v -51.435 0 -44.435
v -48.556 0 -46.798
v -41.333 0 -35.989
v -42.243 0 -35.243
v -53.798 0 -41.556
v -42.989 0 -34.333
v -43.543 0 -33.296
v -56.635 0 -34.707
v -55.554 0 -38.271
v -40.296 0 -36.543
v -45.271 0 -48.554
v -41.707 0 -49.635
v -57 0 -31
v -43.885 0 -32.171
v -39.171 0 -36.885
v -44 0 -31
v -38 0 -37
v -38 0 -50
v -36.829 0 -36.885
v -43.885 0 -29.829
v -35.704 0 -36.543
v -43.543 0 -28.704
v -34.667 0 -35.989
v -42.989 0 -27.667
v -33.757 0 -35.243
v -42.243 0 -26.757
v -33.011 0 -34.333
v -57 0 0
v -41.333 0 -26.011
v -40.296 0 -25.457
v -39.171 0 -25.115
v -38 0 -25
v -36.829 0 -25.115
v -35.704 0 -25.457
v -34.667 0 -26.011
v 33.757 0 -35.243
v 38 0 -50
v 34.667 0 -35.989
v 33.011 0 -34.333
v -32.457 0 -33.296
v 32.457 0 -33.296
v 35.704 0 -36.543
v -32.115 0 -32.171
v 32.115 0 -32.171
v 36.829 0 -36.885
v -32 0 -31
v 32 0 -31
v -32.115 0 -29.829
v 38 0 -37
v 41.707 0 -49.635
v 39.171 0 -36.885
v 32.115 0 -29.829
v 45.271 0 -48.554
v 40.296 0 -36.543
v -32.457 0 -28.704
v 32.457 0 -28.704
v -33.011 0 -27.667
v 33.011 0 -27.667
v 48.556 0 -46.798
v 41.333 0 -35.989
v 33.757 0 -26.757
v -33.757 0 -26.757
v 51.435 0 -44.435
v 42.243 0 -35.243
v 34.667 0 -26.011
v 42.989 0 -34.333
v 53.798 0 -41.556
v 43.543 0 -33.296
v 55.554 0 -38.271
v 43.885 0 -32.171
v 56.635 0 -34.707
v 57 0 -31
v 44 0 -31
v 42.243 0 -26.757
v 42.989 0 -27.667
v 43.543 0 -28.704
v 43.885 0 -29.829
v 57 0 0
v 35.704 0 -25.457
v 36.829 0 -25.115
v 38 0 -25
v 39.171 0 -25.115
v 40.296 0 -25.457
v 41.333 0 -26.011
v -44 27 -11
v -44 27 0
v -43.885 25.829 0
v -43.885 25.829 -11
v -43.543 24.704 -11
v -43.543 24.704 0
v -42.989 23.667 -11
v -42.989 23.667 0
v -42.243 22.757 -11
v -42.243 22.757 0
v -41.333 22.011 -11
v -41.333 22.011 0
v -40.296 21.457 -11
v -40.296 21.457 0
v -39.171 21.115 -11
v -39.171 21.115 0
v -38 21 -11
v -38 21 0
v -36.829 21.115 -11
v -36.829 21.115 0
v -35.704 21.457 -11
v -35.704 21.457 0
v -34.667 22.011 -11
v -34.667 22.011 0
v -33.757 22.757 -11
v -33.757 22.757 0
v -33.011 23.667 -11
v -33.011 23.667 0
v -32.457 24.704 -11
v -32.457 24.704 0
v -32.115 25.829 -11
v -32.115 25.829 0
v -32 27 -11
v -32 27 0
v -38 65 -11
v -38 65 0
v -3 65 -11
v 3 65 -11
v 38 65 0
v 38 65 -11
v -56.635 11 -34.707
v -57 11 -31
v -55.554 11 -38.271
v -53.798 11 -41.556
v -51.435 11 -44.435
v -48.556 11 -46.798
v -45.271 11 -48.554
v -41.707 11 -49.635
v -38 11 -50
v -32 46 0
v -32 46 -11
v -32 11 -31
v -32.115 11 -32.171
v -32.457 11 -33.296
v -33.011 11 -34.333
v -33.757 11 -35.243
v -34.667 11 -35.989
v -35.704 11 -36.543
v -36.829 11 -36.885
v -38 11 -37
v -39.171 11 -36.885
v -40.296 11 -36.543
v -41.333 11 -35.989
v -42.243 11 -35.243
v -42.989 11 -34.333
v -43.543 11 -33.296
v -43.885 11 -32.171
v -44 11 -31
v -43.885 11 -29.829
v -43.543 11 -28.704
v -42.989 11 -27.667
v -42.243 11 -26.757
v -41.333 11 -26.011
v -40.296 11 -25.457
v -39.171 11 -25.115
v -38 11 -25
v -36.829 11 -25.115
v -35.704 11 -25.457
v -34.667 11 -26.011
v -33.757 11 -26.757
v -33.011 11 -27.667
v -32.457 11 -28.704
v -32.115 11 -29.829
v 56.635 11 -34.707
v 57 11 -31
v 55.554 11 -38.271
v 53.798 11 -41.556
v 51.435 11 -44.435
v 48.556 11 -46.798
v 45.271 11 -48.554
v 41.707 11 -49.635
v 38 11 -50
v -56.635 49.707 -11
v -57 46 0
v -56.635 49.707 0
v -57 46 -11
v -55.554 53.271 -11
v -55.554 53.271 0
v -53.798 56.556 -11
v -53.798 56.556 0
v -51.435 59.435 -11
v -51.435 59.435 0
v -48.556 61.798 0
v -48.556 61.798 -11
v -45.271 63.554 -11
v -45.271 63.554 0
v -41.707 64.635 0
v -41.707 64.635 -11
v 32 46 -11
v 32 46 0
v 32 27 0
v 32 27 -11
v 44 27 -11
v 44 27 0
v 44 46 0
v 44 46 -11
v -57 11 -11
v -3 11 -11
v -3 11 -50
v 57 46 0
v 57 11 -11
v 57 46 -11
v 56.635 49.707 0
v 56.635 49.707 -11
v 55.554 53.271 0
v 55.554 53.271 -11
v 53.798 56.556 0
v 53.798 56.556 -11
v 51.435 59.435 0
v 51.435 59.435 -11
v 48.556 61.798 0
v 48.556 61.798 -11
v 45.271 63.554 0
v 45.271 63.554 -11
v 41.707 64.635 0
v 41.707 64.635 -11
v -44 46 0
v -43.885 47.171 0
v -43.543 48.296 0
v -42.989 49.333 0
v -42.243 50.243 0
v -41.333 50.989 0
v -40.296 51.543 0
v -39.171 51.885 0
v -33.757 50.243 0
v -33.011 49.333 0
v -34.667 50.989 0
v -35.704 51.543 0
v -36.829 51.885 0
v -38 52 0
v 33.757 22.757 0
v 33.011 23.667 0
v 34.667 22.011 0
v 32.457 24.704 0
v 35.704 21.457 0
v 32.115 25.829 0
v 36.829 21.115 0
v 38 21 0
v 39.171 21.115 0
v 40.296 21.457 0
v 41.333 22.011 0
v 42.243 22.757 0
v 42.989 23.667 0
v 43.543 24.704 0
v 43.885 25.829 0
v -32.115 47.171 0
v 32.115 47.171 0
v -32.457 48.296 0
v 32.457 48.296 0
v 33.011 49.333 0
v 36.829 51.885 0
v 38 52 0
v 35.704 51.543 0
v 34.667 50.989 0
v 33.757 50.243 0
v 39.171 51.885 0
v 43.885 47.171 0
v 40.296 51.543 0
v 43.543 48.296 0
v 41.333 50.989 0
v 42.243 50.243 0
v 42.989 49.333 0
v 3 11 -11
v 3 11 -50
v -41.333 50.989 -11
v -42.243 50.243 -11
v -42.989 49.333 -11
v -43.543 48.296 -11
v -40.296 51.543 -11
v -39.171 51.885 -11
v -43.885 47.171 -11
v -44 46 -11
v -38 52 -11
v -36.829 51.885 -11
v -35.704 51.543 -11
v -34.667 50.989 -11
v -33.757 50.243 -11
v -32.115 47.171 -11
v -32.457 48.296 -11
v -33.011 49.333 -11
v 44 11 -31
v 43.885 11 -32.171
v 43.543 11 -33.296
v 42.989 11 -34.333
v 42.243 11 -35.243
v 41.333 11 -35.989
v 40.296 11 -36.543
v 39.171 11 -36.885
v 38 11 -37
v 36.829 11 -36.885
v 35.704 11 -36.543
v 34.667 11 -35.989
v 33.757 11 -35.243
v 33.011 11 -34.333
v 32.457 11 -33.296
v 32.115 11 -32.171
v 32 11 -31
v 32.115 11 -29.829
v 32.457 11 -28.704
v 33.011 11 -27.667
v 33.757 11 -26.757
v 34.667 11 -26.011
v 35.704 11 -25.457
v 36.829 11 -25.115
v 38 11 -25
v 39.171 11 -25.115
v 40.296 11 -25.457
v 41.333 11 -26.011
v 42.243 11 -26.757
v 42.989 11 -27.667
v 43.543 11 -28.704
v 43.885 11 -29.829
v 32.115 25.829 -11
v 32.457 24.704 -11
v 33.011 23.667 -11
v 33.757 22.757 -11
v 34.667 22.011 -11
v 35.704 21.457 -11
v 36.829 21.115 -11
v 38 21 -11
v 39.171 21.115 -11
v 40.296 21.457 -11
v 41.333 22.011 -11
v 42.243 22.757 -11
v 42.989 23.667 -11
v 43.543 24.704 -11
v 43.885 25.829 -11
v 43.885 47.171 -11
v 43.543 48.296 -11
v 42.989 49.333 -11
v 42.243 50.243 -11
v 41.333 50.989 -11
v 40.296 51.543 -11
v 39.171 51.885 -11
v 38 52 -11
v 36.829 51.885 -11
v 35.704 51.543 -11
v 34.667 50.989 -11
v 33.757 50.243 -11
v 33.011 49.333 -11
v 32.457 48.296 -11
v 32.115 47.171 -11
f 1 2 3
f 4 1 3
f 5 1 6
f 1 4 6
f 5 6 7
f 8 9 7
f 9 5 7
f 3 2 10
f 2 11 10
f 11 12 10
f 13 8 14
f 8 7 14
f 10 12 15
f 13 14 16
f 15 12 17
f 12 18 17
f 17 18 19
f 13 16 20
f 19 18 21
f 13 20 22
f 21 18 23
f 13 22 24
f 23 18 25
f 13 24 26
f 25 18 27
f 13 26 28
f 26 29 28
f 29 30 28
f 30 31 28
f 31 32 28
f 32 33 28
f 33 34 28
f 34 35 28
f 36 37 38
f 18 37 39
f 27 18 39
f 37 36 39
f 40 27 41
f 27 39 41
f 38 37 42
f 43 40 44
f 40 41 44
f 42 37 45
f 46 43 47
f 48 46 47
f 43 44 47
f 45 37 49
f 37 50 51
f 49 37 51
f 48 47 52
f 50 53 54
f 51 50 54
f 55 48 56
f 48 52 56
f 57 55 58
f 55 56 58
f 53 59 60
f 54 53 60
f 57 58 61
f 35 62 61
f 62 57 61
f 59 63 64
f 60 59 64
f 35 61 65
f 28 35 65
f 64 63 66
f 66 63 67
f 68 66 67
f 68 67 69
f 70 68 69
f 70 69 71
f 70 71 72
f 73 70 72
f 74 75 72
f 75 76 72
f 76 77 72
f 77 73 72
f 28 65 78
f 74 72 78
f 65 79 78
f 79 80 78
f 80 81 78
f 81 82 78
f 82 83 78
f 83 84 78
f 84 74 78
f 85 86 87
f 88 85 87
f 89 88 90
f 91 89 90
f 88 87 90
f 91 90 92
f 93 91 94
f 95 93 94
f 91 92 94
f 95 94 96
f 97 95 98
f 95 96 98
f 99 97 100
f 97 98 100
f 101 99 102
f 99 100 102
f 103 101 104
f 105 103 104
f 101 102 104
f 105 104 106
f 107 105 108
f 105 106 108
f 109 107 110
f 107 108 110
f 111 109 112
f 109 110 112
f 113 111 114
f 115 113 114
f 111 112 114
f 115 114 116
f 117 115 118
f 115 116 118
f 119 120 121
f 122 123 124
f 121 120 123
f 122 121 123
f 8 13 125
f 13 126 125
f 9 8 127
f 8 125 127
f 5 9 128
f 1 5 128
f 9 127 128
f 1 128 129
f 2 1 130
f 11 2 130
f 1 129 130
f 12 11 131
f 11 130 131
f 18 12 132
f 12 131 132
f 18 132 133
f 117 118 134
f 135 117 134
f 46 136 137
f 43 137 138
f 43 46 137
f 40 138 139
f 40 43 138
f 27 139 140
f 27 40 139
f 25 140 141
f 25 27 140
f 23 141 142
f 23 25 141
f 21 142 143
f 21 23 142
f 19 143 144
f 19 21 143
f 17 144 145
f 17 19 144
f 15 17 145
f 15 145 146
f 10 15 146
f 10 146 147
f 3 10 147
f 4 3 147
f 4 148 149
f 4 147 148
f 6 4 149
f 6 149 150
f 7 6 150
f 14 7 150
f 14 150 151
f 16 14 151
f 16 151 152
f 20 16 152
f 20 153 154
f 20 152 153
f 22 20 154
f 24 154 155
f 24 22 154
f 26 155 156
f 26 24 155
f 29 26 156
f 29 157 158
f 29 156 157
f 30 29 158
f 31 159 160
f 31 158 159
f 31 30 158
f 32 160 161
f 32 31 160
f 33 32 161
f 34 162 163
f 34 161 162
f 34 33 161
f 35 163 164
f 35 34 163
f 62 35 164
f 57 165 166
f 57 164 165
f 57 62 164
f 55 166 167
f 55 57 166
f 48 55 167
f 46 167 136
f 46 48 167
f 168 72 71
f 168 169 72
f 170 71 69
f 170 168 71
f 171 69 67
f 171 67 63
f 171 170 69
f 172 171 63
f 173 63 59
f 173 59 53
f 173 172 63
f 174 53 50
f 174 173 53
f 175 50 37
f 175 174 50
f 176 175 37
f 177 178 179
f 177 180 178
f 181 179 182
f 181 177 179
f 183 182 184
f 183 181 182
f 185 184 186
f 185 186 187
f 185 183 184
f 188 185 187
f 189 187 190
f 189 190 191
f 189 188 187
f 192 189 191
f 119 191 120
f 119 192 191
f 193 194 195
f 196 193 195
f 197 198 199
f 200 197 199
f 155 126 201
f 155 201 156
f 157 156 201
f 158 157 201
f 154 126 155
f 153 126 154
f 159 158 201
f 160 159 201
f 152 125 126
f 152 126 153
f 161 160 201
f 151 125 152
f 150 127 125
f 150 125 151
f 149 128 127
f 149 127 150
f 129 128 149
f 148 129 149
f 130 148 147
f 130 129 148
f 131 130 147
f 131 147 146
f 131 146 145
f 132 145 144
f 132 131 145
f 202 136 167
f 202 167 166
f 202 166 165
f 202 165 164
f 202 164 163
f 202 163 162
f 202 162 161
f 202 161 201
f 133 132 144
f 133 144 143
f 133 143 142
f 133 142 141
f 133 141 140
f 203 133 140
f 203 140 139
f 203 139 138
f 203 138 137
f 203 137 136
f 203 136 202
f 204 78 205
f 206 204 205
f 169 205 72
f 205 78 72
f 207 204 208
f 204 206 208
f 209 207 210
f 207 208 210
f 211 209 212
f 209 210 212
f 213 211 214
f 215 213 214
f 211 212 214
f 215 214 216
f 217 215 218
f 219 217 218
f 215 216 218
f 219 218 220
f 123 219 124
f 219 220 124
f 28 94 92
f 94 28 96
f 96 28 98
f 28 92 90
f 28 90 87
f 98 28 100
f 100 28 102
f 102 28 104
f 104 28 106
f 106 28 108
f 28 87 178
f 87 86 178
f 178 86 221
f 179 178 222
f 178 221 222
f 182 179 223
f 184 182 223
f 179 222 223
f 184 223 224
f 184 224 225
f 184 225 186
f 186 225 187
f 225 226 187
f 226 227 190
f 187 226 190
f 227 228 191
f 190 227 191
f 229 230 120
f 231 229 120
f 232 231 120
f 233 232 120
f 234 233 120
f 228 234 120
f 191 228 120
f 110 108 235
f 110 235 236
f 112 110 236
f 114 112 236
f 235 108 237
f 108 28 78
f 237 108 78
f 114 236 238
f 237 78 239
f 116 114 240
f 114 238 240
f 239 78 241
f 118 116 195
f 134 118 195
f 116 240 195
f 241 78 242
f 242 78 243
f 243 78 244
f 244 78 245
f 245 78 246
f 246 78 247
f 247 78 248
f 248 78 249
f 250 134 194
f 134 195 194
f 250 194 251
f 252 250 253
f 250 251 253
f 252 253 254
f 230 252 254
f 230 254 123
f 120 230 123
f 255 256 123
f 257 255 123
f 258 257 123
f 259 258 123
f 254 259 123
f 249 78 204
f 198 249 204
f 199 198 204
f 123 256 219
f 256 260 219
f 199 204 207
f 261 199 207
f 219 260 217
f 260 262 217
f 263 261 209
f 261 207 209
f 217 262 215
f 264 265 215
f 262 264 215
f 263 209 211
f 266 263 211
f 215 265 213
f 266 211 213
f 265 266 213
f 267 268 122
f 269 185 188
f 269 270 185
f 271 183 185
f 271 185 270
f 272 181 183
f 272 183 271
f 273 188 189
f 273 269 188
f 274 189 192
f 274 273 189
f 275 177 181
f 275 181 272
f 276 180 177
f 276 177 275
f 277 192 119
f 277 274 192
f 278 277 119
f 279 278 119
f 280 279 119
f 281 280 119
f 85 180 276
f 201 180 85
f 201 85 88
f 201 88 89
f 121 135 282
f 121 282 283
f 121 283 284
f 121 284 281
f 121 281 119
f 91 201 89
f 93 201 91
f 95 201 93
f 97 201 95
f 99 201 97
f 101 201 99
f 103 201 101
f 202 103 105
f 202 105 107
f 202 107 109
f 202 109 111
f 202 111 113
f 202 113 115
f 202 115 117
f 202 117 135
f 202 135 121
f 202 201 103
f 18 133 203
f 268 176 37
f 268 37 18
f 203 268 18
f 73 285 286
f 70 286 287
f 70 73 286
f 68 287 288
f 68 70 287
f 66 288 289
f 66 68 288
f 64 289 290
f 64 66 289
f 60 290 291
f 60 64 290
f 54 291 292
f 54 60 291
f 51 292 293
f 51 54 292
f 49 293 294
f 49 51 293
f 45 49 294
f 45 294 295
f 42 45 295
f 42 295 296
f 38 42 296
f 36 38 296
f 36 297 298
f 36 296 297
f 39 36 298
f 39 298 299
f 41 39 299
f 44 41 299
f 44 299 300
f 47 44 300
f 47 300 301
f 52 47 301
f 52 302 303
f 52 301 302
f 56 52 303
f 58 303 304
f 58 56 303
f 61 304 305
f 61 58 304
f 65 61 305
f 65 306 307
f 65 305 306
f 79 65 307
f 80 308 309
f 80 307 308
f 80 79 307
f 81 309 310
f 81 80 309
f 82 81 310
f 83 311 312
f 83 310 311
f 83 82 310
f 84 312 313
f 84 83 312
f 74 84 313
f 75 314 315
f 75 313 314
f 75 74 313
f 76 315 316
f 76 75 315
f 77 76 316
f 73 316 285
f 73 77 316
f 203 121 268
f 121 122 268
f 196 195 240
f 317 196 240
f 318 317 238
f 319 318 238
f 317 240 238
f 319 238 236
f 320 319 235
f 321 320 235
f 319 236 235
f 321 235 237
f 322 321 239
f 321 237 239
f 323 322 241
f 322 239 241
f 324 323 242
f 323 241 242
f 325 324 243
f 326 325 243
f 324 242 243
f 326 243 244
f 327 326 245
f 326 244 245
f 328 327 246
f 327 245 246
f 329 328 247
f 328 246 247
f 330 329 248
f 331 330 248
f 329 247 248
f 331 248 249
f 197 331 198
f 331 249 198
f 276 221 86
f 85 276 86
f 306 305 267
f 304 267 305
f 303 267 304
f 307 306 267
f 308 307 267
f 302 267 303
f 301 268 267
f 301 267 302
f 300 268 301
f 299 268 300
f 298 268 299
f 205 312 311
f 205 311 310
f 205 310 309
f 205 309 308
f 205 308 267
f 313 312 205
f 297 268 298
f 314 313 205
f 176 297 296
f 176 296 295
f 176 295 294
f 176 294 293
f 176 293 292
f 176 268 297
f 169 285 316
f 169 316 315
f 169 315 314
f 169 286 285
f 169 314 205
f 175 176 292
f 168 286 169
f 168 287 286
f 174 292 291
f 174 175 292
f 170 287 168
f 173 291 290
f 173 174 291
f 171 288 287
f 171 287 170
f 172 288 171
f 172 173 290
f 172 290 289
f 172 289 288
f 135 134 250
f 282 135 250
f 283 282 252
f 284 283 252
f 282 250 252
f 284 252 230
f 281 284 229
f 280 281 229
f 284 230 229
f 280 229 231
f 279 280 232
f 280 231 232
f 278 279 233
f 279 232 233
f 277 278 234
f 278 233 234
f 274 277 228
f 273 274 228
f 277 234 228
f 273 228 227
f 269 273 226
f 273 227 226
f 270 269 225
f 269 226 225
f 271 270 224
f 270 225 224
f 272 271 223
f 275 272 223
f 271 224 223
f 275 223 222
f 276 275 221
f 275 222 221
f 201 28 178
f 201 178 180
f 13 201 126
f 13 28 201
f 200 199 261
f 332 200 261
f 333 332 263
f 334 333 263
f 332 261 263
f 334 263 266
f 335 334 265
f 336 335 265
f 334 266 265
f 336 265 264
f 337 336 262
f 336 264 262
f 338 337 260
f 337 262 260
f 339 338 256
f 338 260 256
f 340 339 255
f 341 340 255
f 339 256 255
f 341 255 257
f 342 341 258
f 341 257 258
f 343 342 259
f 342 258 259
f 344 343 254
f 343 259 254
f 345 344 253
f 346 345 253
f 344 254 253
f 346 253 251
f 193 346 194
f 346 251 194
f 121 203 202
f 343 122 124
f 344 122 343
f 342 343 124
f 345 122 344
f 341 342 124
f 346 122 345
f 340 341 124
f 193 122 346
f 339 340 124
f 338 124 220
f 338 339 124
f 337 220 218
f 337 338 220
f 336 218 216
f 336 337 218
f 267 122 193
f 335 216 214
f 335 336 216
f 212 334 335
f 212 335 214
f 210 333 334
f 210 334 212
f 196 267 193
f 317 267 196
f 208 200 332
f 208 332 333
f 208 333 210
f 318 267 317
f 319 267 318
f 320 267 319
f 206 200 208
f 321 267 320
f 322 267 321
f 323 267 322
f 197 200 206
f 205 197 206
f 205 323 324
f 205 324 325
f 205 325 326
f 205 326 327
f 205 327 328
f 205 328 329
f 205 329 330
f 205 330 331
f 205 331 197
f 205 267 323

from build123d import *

# Parameters (mm, degrees)
SKETCH_2_W          = 114
SKETCH_2_H          = 50
EXTRUDE_1_DEPTH     = 11
FILLET_1_R          = 19
SKETCH_3_W          = 114
SKETCH_3_H          = 11
EXTRUDE_2_DEPTH     = 65
FILLET_2_R          = 19
SKETCH_4_R          = 6
CUT_EXTRUDE_1_DEPTH = 66
CUT_EXTRUDE_3_DEPTH = 65
EXTRUDE_3_DEPTH     = 3


with BuildPart() as part:
    # 스케치2 → 보스-돌출1 (new body)
    with BuildSketch(Plane(origin=(0, 0, 0), x_dir=(1, 0, 0), z_dir=(0, 1, 0))):
        with Locations((0, 25)):
            Rectangle(SKETCH_2_W, SKETCH_2_H)
    extrude(amount=EXTRUDE_1_DEPTH)

    # 필렛1
    fillet_1_edges = [part.edges().sort_by_distance(p)[0] for p in [
        (-57, 5.5, -50),
        (57, 5.5, -50),
    ]]
    fillet(fillet_1_edges, radius=FILLET_1_R)

    # 스케치3 → 보스-돌출2 (add)
    with BuildSketch(Plane(origin=(0, 0, 0), x_dir=(1, 0, 0), z_dir=(0, 1, 0))):
        with Locations((0, 5.5)):
            Rectangle(SKETCH_3_W, SKETCH_3_H)
    extrude(amount=EXTRUDE_2_DEPTH)

    # 필렛2
    fillet_2_edges = [part.edges().sort_by_distance(p)[0] for p in [
        (57, 65, -5.5),
        (-57, 65, -5.5),
    ]]
    fillet(fillet_2_edges, radius=FILLET_2_R)

    # 스케치4 → 컷-돌출1 (cut, through all)
    with BuildSketch(Plane(origin=(0, 0, 0), x_dir=(1, 0, 0), z_dir=(0, 1, 0))):
        with Locations((-38, 31)):
            Circle(SKETCH_4_R)
        with Locations((38, 31)):
            Circle(SKETCH_4_R)
    extrude(amount=CUT_EXTRUDE_1_DEPTH, mode=Mode.SUBTRACT)

    # 스케치5 → 컷-돌출3 (cut)
    with BuildSketch(Plane.XY):
        with BuildLine():
            Line((-44, 46), (-44, 27))
            ThreePointArc((-44, 27), (-38, 21), (-32, 27))
            Line((-32, 27), (-32, 46))
            ThreePointArc((-32, 46), (-38, 52), (-44, 46))
        make_face()
        with BuildLine():
            Line((32, 46), (32, 27))
            ThreePointArc((32, 27), (38, 21), (44, 27))
            Line((44, 27), (44, 46))
            ThreePointArc((44, 46), (38, 52), (32, 46))
        make_face()
    extrude(amount=-CUT_EXTRUDE_3_DEPTH, mode=Mode.SUBTRACT)

    # 스케치9 → 보스-돌출3 (add, symmetric)
    with BuildSketch(Plane(origin=(0, 0, 0), x_dir=(0, 0, -1), z_dir=(1, 0, 0))):
        Polygon((0, 65), (11, 65), (50, 11), (50, 0), (0, 0), align=None)
    extrude(amount=EXTRUDE_3_DEPTH, both=True)


solid = part.part
